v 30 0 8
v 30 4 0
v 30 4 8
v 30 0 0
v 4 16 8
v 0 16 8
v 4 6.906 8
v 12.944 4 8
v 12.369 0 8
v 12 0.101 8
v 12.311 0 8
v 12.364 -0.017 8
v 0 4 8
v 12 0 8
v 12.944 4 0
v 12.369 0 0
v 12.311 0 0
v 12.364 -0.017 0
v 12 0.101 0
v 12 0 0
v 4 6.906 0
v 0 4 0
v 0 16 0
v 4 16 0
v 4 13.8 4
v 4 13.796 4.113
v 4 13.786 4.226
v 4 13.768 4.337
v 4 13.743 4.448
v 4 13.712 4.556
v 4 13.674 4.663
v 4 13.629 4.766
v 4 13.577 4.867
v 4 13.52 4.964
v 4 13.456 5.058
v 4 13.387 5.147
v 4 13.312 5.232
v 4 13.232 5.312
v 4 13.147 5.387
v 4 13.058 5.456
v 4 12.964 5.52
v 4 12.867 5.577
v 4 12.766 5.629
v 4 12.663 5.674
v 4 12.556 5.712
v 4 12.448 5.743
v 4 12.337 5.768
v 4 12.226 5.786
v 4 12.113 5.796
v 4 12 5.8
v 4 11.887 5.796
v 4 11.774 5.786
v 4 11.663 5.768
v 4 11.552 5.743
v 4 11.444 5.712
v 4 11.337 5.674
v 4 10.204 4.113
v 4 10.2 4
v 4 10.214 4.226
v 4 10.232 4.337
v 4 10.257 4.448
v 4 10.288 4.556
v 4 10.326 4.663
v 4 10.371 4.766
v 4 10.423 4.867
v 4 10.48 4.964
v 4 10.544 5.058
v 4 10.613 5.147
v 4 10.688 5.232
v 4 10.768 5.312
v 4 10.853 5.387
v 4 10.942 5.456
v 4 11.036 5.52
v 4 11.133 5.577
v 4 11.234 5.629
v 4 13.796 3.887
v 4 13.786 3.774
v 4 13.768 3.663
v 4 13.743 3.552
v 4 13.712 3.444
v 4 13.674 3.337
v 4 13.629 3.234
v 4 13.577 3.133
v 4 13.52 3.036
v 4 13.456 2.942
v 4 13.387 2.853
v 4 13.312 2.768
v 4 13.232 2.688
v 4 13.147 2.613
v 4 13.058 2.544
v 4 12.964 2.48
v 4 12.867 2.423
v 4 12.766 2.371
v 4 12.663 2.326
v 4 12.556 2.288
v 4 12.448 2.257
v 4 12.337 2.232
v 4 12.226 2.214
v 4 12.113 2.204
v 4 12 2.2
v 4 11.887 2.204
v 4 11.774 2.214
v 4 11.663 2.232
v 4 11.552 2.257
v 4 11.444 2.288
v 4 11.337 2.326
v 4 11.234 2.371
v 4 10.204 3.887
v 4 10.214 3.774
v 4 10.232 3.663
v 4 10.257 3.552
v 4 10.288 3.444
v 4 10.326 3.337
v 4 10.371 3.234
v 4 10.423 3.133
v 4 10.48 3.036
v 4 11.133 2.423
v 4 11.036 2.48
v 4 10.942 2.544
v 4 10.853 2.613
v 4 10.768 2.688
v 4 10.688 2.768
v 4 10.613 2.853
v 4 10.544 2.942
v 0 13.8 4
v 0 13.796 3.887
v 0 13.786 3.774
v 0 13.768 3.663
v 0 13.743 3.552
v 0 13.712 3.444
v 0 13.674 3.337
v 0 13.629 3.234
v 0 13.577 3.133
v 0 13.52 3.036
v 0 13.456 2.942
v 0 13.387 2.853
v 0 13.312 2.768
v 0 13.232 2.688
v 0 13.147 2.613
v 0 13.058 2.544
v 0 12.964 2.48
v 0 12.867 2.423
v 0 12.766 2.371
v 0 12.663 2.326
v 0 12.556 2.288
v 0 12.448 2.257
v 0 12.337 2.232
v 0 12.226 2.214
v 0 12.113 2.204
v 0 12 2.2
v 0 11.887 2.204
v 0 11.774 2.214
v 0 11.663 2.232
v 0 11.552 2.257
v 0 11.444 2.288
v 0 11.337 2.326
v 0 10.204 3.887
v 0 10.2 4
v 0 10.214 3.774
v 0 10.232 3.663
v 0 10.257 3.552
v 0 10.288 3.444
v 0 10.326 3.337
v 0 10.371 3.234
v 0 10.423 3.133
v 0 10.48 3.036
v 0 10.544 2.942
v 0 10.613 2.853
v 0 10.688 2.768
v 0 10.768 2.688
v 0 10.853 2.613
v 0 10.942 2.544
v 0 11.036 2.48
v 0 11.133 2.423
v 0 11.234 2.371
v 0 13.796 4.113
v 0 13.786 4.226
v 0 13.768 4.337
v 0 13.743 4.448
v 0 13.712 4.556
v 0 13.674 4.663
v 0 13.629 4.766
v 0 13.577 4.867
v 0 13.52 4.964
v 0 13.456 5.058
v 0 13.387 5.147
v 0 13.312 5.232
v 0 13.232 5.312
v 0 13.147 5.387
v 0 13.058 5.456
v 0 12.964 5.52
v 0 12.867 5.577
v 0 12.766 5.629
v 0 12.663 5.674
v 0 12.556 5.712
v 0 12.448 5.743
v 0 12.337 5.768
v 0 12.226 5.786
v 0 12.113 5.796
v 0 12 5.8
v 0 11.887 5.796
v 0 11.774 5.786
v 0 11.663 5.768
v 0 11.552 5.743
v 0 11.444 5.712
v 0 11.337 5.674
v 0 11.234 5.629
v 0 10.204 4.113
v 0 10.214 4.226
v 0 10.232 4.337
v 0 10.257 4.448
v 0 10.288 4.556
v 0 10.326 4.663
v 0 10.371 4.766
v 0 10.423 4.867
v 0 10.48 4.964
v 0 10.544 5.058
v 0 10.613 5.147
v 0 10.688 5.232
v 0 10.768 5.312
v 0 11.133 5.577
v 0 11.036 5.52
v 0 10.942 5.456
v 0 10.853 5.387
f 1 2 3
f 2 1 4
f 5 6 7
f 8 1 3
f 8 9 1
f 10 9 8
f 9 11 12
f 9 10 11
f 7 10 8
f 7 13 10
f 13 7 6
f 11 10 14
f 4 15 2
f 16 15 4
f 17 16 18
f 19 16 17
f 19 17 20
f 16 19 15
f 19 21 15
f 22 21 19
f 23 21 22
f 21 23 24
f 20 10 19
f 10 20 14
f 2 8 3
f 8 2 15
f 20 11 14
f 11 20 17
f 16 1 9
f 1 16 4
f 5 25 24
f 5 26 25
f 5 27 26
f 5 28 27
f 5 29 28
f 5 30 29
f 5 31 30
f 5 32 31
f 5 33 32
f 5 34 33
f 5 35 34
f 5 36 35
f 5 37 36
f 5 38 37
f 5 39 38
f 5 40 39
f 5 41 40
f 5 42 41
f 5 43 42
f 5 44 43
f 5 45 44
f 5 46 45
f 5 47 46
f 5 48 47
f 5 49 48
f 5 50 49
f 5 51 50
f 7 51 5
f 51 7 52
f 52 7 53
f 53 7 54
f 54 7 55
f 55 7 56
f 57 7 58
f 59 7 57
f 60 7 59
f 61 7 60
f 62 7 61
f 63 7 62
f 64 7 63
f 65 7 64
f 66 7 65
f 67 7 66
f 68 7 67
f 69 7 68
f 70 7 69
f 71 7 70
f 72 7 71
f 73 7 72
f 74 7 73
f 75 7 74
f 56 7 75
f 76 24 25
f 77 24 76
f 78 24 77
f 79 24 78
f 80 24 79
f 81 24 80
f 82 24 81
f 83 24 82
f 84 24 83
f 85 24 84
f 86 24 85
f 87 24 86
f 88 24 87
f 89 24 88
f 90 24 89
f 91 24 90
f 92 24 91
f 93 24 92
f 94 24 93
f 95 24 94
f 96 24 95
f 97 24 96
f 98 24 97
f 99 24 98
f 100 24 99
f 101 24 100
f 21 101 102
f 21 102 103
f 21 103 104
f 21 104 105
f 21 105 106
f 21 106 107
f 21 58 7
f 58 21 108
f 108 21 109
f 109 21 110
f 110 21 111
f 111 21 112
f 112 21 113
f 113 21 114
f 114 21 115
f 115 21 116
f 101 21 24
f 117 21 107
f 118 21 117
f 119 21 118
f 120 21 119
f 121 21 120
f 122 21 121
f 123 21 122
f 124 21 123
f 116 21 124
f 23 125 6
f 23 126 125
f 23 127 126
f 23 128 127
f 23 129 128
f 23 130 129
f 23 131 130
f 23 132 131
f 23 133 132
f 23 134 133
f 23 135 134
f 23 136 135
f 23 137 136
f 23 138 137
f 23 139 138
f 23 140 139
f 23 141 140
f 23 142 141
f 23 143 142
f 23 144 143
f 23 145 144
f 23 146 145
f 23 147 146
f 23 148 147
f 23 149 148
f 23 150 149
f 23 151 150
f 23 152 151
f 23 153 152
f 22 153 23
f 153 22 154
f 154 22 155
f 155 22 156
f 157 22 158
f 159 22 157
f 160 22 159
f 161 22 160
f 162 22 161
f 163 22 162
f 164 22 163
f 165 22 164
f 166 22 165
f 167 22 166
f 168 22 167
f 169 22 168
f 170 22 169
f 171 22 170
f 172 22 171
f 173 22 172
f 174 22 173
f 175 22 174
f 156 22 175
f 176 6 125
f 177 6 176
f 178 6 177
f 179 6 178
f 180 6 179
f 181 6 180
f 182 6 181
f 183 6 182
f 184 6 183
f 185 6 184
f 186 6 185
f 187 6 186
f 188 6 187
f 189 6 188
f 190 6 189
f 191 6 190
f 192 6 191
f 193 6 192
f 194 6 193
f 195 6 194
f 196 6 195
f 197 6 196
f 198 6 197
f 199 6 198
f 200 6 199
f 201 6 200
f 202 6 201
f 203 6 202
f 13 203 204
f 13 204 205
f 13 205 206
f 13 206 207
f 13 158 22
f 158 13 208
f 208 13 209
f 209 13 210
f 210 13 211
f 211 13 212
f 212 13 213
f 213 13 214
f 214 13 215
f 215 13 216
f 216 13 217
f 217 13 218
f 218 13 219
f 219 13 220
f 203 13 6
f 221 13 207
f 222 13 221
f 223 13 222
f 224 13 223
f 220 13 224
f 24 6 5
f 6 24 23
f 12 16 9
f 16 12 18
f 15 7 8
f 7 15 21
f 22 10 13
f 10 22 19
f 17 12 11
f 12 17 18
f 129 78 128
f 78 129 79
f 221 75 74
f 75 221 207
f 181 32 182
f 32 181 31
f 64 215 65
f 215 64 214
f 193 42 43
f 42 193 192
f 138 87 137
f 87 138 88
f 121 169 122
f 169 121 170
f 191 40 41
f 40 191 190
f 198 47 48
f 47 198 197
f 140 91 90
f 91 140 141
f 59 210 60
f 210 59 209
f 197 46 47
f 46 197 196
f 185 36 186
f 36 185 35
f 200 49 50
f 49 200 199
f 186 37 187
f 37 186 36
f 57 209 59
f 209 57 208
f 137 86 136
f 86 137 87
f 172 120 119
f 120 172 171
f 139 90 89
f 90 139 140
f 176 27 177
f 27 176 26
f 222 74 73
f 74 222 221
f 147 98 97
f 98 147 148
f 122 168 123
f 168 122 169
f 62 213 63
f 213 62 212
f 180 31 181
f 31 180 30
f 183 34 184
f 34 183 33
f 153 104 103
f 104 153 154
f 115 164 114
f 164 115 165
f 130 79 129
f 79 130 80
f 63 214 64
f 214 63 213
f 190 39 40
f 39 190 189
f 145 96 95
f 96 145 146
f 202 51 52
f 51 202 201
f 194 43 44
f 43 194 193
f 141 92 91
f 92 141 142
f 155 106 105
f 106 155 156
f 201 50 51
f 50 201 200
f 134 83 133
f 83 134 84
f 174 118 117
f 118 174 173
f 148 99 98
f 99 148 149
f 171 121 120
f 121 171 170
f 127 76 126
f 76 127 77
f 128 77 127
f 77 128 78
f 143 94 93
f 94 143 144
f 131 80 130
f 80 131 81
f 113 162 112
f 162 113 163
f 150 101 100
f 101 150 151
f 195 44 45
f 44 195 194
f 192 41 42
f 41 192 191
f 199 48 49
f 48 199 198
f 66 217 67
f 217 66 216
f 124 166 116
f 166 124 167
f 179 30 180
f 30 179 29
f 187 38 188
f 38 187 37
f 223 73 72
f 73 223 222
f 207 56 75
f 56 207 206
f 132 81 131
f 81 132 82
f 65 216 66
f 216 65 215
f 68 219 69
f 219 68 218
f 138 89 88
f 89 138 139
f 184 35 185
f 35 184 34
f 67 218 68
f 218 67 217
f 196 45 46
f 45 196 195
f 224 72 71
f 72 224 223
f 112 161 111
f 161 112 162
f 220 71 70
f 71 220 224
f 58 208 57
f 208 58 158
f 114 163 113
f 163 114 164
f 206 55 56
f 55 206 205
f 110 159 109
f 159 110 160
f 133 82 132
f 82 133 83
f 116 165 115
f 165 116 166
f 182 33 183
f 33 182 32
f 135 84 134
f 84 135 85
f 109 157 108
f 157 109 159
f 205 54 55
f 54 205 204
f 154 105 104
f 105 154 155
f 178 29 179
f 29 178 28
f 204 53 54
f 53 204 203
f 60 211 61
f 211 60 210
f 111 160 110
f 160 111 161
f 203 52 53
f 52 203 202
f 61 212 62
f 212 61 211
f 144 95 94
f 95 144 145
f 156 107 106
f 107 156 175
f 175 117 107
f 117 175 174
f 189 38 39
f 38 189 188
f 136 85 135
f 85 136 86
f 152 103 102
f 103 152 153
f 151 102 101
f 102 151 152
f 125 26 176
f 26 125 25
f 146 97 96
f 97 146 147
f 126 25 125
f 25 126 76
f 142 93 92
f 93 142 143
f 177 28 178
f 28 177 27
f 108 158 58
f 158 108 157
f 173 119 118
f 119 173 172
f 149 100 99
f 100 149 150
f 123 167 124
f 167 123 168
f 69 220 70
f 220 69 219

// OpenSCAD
// file: nuts.scad
//  M3
m3_thread_r = 1.4;
m3_hole_r = 1.8;
m3_head_r = 6.3/2;

//  M4
m4_thread_r = 1.9;
m4_hole_r = 2.1;
m4_nut_outer_r = 7.7 / 2;
m4_nut_min_r = 6.8 / 2;
m4_csink_r = 7.7/2;
m4_csink_d = 3;

function nut_hexagon(width) =
    // width is the distance between nut faces
    // eg m4_nut_min_r*2
    let (face_len = width / sqrt(3)) // w/tan(30)
    let (F = face_len / 2)
    let (W = width / 2)
    let (outer = sqrt((F * F) + (W * W)))
    [
        [ -F, W ],
        [ F, W ],
        [ outer, 0 ],
        [ F, -W ],
        [ -F, -W ],
        [ -outer, 0 ],
        [ -F, W ],
    ];

//  FIN
// main file
include <nuts.scad>

h = 30;
h2 = 12;
w = 4;
d = 8;
d2 = 12;


$fn = 100;

difference()
{
    translate( [ 0, 0, 0 ] )
    {
        translate( [ h2, 0, 0 ] )
        cube( [ h-h2, w, d ] );

        translate( [ 0, w, 0 ] )
        cube( [ w, d2, d ] );

        translate( [ 0, w, 0 ] )
        rotate( [ 0, 0, -18 ] )
        cube( [ 13, w, d ] );
    }

    translate( [ w+0.01, d2, w ] )
    rotate( [ 0, 270, 0 ] )
    cylinder(h=w+0.02, r1=m3_hole_r, r2=m3_hole_r);
}

//  FIN
